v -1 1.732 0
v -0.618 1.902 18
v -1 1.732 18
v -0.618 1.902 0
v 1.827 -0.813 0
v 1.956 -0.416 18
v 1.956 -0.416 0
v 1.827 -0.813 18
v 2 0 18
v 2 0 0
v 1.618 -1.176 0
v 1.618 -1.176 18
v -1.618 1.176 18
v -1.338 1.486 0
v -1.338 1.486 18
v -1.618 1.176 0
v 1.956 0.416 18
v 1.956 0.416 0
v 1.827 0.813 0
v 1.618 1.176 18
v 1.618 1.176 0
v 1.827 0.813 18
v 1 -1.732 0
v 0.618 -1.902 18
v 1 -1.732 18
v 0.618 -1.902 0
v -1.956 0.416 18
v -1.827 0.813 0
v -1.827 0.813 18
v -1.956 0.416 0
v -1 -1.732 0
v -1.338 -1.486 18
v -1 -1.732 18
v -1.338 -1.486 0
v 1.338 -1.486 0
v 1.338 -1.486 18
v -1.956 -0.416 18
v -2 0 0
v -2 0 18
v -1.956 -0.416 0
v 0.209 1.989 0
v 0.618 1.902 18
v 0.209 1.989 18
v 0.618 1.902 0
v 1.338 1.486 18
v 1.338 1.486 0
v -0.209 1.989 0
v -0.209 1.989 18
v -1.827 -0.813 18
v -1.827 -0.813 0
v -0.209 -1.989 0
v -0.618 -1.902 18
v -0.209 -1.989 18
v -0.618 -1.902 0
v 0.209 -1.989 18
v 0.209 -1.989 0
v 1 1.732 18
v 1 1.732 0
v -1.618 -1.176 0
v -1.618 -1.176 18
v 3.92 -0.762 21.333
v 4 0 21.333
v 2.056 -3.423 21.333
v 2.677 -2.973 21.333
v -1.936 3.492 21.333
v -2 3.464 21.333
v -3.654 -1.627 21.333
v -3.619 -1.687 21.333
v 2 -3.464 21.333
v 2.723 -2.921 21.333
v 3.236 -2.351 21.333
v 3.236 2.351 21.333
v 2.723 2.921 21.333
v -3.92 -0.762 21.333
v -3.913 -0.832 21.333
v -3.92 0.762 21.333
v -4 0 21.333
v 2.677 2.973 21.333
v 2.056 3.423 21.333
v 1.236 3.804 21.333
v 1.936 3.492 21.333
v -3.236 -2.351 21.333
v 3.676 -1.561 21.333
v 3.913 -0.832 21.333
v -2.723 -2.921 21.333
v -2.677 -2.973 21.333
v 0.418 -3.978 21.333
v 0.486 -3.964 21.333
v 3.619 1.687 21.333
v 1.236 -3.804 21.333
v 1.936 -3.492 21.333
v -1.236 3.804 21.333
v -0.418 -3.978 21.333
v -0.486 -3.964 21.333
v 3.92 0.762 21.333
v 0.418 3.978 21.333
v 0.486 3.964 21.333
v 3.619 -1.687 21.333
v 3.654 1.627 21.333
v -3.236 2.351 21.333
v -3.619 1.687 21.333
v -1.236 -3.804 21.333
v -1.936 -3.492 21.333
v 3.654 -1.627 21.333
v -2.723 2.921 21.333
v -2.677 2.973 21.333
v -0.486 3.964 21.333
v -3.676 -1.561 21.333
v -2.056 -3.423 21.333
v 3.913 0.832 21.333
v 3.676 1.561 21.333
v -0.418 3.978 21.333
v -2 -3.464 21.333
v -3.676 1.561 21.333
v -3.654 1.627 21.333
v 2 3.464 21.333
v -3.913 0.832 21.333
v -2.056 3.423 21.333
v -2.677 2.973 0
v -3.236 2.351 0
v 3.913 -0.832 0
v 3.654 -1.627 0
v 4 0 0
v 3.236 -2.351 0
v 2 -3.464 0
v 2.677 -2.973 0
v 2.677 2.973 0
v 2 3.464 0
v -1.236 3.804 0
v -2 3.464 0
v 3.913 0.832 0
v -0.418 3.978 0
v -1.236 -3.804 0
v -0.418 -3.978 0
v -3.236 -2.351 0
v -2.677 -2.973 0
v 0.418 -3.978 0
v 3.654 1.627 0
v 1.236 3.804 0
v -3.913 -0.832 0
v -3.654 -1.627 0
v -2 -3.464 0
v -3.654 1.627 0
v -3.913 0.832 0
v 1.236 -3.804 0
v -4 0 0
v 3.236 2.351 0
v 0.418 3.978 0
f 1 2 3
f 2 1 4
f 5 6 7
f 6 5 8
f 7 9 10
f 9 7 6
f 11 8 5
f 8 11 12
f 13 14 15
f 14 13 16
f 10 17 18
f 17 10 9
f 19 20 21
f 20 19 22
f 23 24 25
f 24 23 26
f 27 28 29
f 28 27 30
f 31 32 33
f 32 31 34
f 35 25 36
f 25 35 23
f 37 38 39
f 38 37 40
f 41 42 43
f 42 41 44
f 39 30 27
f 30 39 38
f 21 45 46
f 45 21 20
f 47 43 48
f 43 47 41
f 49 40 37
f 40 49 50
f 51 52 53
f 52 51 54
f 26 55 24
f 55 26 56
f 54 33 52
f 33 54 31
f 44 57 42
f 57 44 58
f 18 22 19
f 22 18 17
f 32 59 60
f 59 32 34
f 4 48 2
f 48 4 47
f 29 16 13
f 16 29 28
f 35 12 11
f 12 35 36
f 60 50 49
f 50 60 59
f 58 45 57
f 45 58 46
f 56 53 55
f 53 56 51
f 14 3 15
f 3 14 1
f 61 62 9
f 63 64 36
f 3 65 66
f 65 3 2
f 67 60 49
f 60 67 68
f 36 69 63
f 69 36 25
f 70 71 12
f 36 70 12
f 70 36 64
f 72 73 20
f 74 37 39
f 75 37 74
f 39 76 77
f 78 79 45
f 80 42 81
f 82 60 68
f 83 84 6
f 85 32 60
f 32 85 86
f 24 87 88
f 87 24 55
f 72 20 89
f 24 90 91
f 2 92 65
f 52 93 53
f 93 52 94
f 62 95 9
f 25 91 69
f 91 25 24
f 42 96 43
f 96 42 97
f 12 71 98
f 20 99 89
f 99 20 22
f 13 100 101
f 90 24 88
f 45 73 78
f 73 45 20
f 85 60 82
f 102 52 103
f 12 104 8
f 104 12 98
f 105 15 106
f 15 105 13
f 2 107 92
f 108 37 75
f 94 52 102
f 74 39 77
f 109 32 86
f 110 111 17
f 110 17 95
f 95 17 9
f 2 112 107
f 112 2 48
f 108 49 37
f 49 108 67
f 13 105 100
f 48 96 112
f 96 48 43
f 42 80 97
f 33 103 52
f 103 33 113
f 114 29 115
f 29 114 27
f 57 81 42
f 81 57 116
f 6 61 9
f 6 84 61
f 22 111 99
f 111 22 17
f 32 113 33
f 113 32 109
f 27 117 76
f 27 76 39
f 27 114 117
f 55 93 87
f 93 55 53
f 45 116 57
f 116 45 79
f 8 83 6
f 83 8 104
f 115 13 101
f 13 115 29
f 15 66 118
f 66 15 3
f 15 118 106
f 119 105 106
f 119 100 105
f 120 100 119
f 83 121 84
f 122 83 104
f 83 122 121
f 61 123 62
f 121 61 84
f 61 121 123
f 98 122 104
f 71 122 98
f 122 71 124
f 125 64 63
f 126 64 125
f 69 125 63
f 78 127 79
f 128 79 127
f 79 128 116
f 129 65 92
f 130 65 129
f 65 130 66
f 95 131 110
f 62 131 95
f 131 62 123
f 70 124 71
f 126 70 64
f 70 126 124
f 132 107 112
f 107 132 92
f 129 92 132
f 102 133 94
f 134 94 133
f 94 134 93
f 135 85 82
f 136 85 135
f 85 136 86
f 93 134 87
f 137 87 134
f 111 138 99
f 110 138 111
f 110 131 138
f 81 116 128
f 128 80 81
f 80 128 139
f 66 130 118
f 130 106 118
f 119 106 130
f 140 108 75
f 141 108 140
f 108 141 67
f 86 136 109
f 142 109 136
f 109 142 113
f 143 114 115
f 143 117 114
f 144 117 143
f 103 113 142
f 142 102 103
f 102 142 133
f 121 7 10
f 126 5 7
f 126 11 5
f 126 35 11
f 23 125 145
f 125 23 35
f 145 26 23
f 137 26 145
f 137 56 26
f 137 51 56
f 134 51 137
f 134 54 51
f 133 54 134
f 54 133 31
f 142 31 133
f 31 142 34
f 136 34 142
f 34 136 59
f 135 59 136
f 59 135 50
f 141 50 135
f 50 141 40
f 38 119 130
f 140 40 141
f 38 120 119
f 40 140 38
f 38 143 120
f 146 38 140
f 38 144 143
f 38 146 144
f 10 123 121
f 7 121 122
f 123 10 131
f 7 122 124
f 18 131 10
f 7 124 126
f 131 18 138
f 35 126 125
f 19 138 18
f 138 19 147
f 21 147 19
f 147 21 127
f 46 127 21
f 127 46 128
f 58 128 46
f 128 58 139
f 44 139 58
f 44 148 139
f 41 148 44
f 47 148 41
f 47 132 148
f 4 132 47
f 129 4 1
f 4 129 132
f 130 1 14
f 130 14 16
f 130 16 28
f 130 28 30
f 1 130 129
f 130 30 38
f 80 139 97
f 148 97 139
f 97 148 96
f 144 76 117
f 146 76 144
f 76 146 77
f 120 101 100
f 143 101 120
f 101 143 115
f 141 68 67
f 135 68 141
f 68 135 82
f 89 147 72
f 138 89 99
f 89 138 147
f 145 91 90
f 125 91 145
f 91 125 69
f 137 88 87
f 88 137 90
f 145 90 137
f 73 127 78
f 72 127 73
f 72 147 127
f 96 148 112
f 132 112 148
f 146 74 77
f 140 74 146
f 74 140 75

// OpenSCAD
// file: m5.scad
module boltHead(){
  $fn = 30;
  cylinder(r1 = 4.4, r2 = 2, h = 4, center = false);
}

module m5Bolt(length = 20){
  translate([0, 0, 4]){
    cylinder(r = 2, h = length, center = false, $fn = 30);
  }
  boltHead();
}

module m5Nut(){
  translate([0, 0, 2]){
    union(){
      cube([8, 4.6, 4], center = true);
      rotate([0, 0, 120]){
        cube([8, 4.6, 4], center = true);
      }
      rotate([0, 0, 240]){
        cube([8, 4.6, 4], center = true);
      }
    }
  }
}

module m5NutInsert(depth = 30){
    $fn=30;
    union(){
      m5Nut();
      translate([depth / 2, 0, 2]){
        rotate([90, 90, 0]){
          cube(size = [4, depth, 9.2], center = true);
        }
      }
      cylinder(r=2.5, h=20, center=false);
    }
}

// m5Bolt();
m5Nut();
m5NutInsert();
// main file
use<m5.scad>

module boltShaft(bearingShaftSize = 8, bearingHeight = 22){
  $fn = 30;
  rotate([180, 0, 0]){
    translate([0, 0, -bearingHeight]){
      difference(){
        cylinder(d = bearingShaftSize, h = bearingHeight, center = false);
        m5Bolt();
      }
    }
  }

}
boltShaft();
